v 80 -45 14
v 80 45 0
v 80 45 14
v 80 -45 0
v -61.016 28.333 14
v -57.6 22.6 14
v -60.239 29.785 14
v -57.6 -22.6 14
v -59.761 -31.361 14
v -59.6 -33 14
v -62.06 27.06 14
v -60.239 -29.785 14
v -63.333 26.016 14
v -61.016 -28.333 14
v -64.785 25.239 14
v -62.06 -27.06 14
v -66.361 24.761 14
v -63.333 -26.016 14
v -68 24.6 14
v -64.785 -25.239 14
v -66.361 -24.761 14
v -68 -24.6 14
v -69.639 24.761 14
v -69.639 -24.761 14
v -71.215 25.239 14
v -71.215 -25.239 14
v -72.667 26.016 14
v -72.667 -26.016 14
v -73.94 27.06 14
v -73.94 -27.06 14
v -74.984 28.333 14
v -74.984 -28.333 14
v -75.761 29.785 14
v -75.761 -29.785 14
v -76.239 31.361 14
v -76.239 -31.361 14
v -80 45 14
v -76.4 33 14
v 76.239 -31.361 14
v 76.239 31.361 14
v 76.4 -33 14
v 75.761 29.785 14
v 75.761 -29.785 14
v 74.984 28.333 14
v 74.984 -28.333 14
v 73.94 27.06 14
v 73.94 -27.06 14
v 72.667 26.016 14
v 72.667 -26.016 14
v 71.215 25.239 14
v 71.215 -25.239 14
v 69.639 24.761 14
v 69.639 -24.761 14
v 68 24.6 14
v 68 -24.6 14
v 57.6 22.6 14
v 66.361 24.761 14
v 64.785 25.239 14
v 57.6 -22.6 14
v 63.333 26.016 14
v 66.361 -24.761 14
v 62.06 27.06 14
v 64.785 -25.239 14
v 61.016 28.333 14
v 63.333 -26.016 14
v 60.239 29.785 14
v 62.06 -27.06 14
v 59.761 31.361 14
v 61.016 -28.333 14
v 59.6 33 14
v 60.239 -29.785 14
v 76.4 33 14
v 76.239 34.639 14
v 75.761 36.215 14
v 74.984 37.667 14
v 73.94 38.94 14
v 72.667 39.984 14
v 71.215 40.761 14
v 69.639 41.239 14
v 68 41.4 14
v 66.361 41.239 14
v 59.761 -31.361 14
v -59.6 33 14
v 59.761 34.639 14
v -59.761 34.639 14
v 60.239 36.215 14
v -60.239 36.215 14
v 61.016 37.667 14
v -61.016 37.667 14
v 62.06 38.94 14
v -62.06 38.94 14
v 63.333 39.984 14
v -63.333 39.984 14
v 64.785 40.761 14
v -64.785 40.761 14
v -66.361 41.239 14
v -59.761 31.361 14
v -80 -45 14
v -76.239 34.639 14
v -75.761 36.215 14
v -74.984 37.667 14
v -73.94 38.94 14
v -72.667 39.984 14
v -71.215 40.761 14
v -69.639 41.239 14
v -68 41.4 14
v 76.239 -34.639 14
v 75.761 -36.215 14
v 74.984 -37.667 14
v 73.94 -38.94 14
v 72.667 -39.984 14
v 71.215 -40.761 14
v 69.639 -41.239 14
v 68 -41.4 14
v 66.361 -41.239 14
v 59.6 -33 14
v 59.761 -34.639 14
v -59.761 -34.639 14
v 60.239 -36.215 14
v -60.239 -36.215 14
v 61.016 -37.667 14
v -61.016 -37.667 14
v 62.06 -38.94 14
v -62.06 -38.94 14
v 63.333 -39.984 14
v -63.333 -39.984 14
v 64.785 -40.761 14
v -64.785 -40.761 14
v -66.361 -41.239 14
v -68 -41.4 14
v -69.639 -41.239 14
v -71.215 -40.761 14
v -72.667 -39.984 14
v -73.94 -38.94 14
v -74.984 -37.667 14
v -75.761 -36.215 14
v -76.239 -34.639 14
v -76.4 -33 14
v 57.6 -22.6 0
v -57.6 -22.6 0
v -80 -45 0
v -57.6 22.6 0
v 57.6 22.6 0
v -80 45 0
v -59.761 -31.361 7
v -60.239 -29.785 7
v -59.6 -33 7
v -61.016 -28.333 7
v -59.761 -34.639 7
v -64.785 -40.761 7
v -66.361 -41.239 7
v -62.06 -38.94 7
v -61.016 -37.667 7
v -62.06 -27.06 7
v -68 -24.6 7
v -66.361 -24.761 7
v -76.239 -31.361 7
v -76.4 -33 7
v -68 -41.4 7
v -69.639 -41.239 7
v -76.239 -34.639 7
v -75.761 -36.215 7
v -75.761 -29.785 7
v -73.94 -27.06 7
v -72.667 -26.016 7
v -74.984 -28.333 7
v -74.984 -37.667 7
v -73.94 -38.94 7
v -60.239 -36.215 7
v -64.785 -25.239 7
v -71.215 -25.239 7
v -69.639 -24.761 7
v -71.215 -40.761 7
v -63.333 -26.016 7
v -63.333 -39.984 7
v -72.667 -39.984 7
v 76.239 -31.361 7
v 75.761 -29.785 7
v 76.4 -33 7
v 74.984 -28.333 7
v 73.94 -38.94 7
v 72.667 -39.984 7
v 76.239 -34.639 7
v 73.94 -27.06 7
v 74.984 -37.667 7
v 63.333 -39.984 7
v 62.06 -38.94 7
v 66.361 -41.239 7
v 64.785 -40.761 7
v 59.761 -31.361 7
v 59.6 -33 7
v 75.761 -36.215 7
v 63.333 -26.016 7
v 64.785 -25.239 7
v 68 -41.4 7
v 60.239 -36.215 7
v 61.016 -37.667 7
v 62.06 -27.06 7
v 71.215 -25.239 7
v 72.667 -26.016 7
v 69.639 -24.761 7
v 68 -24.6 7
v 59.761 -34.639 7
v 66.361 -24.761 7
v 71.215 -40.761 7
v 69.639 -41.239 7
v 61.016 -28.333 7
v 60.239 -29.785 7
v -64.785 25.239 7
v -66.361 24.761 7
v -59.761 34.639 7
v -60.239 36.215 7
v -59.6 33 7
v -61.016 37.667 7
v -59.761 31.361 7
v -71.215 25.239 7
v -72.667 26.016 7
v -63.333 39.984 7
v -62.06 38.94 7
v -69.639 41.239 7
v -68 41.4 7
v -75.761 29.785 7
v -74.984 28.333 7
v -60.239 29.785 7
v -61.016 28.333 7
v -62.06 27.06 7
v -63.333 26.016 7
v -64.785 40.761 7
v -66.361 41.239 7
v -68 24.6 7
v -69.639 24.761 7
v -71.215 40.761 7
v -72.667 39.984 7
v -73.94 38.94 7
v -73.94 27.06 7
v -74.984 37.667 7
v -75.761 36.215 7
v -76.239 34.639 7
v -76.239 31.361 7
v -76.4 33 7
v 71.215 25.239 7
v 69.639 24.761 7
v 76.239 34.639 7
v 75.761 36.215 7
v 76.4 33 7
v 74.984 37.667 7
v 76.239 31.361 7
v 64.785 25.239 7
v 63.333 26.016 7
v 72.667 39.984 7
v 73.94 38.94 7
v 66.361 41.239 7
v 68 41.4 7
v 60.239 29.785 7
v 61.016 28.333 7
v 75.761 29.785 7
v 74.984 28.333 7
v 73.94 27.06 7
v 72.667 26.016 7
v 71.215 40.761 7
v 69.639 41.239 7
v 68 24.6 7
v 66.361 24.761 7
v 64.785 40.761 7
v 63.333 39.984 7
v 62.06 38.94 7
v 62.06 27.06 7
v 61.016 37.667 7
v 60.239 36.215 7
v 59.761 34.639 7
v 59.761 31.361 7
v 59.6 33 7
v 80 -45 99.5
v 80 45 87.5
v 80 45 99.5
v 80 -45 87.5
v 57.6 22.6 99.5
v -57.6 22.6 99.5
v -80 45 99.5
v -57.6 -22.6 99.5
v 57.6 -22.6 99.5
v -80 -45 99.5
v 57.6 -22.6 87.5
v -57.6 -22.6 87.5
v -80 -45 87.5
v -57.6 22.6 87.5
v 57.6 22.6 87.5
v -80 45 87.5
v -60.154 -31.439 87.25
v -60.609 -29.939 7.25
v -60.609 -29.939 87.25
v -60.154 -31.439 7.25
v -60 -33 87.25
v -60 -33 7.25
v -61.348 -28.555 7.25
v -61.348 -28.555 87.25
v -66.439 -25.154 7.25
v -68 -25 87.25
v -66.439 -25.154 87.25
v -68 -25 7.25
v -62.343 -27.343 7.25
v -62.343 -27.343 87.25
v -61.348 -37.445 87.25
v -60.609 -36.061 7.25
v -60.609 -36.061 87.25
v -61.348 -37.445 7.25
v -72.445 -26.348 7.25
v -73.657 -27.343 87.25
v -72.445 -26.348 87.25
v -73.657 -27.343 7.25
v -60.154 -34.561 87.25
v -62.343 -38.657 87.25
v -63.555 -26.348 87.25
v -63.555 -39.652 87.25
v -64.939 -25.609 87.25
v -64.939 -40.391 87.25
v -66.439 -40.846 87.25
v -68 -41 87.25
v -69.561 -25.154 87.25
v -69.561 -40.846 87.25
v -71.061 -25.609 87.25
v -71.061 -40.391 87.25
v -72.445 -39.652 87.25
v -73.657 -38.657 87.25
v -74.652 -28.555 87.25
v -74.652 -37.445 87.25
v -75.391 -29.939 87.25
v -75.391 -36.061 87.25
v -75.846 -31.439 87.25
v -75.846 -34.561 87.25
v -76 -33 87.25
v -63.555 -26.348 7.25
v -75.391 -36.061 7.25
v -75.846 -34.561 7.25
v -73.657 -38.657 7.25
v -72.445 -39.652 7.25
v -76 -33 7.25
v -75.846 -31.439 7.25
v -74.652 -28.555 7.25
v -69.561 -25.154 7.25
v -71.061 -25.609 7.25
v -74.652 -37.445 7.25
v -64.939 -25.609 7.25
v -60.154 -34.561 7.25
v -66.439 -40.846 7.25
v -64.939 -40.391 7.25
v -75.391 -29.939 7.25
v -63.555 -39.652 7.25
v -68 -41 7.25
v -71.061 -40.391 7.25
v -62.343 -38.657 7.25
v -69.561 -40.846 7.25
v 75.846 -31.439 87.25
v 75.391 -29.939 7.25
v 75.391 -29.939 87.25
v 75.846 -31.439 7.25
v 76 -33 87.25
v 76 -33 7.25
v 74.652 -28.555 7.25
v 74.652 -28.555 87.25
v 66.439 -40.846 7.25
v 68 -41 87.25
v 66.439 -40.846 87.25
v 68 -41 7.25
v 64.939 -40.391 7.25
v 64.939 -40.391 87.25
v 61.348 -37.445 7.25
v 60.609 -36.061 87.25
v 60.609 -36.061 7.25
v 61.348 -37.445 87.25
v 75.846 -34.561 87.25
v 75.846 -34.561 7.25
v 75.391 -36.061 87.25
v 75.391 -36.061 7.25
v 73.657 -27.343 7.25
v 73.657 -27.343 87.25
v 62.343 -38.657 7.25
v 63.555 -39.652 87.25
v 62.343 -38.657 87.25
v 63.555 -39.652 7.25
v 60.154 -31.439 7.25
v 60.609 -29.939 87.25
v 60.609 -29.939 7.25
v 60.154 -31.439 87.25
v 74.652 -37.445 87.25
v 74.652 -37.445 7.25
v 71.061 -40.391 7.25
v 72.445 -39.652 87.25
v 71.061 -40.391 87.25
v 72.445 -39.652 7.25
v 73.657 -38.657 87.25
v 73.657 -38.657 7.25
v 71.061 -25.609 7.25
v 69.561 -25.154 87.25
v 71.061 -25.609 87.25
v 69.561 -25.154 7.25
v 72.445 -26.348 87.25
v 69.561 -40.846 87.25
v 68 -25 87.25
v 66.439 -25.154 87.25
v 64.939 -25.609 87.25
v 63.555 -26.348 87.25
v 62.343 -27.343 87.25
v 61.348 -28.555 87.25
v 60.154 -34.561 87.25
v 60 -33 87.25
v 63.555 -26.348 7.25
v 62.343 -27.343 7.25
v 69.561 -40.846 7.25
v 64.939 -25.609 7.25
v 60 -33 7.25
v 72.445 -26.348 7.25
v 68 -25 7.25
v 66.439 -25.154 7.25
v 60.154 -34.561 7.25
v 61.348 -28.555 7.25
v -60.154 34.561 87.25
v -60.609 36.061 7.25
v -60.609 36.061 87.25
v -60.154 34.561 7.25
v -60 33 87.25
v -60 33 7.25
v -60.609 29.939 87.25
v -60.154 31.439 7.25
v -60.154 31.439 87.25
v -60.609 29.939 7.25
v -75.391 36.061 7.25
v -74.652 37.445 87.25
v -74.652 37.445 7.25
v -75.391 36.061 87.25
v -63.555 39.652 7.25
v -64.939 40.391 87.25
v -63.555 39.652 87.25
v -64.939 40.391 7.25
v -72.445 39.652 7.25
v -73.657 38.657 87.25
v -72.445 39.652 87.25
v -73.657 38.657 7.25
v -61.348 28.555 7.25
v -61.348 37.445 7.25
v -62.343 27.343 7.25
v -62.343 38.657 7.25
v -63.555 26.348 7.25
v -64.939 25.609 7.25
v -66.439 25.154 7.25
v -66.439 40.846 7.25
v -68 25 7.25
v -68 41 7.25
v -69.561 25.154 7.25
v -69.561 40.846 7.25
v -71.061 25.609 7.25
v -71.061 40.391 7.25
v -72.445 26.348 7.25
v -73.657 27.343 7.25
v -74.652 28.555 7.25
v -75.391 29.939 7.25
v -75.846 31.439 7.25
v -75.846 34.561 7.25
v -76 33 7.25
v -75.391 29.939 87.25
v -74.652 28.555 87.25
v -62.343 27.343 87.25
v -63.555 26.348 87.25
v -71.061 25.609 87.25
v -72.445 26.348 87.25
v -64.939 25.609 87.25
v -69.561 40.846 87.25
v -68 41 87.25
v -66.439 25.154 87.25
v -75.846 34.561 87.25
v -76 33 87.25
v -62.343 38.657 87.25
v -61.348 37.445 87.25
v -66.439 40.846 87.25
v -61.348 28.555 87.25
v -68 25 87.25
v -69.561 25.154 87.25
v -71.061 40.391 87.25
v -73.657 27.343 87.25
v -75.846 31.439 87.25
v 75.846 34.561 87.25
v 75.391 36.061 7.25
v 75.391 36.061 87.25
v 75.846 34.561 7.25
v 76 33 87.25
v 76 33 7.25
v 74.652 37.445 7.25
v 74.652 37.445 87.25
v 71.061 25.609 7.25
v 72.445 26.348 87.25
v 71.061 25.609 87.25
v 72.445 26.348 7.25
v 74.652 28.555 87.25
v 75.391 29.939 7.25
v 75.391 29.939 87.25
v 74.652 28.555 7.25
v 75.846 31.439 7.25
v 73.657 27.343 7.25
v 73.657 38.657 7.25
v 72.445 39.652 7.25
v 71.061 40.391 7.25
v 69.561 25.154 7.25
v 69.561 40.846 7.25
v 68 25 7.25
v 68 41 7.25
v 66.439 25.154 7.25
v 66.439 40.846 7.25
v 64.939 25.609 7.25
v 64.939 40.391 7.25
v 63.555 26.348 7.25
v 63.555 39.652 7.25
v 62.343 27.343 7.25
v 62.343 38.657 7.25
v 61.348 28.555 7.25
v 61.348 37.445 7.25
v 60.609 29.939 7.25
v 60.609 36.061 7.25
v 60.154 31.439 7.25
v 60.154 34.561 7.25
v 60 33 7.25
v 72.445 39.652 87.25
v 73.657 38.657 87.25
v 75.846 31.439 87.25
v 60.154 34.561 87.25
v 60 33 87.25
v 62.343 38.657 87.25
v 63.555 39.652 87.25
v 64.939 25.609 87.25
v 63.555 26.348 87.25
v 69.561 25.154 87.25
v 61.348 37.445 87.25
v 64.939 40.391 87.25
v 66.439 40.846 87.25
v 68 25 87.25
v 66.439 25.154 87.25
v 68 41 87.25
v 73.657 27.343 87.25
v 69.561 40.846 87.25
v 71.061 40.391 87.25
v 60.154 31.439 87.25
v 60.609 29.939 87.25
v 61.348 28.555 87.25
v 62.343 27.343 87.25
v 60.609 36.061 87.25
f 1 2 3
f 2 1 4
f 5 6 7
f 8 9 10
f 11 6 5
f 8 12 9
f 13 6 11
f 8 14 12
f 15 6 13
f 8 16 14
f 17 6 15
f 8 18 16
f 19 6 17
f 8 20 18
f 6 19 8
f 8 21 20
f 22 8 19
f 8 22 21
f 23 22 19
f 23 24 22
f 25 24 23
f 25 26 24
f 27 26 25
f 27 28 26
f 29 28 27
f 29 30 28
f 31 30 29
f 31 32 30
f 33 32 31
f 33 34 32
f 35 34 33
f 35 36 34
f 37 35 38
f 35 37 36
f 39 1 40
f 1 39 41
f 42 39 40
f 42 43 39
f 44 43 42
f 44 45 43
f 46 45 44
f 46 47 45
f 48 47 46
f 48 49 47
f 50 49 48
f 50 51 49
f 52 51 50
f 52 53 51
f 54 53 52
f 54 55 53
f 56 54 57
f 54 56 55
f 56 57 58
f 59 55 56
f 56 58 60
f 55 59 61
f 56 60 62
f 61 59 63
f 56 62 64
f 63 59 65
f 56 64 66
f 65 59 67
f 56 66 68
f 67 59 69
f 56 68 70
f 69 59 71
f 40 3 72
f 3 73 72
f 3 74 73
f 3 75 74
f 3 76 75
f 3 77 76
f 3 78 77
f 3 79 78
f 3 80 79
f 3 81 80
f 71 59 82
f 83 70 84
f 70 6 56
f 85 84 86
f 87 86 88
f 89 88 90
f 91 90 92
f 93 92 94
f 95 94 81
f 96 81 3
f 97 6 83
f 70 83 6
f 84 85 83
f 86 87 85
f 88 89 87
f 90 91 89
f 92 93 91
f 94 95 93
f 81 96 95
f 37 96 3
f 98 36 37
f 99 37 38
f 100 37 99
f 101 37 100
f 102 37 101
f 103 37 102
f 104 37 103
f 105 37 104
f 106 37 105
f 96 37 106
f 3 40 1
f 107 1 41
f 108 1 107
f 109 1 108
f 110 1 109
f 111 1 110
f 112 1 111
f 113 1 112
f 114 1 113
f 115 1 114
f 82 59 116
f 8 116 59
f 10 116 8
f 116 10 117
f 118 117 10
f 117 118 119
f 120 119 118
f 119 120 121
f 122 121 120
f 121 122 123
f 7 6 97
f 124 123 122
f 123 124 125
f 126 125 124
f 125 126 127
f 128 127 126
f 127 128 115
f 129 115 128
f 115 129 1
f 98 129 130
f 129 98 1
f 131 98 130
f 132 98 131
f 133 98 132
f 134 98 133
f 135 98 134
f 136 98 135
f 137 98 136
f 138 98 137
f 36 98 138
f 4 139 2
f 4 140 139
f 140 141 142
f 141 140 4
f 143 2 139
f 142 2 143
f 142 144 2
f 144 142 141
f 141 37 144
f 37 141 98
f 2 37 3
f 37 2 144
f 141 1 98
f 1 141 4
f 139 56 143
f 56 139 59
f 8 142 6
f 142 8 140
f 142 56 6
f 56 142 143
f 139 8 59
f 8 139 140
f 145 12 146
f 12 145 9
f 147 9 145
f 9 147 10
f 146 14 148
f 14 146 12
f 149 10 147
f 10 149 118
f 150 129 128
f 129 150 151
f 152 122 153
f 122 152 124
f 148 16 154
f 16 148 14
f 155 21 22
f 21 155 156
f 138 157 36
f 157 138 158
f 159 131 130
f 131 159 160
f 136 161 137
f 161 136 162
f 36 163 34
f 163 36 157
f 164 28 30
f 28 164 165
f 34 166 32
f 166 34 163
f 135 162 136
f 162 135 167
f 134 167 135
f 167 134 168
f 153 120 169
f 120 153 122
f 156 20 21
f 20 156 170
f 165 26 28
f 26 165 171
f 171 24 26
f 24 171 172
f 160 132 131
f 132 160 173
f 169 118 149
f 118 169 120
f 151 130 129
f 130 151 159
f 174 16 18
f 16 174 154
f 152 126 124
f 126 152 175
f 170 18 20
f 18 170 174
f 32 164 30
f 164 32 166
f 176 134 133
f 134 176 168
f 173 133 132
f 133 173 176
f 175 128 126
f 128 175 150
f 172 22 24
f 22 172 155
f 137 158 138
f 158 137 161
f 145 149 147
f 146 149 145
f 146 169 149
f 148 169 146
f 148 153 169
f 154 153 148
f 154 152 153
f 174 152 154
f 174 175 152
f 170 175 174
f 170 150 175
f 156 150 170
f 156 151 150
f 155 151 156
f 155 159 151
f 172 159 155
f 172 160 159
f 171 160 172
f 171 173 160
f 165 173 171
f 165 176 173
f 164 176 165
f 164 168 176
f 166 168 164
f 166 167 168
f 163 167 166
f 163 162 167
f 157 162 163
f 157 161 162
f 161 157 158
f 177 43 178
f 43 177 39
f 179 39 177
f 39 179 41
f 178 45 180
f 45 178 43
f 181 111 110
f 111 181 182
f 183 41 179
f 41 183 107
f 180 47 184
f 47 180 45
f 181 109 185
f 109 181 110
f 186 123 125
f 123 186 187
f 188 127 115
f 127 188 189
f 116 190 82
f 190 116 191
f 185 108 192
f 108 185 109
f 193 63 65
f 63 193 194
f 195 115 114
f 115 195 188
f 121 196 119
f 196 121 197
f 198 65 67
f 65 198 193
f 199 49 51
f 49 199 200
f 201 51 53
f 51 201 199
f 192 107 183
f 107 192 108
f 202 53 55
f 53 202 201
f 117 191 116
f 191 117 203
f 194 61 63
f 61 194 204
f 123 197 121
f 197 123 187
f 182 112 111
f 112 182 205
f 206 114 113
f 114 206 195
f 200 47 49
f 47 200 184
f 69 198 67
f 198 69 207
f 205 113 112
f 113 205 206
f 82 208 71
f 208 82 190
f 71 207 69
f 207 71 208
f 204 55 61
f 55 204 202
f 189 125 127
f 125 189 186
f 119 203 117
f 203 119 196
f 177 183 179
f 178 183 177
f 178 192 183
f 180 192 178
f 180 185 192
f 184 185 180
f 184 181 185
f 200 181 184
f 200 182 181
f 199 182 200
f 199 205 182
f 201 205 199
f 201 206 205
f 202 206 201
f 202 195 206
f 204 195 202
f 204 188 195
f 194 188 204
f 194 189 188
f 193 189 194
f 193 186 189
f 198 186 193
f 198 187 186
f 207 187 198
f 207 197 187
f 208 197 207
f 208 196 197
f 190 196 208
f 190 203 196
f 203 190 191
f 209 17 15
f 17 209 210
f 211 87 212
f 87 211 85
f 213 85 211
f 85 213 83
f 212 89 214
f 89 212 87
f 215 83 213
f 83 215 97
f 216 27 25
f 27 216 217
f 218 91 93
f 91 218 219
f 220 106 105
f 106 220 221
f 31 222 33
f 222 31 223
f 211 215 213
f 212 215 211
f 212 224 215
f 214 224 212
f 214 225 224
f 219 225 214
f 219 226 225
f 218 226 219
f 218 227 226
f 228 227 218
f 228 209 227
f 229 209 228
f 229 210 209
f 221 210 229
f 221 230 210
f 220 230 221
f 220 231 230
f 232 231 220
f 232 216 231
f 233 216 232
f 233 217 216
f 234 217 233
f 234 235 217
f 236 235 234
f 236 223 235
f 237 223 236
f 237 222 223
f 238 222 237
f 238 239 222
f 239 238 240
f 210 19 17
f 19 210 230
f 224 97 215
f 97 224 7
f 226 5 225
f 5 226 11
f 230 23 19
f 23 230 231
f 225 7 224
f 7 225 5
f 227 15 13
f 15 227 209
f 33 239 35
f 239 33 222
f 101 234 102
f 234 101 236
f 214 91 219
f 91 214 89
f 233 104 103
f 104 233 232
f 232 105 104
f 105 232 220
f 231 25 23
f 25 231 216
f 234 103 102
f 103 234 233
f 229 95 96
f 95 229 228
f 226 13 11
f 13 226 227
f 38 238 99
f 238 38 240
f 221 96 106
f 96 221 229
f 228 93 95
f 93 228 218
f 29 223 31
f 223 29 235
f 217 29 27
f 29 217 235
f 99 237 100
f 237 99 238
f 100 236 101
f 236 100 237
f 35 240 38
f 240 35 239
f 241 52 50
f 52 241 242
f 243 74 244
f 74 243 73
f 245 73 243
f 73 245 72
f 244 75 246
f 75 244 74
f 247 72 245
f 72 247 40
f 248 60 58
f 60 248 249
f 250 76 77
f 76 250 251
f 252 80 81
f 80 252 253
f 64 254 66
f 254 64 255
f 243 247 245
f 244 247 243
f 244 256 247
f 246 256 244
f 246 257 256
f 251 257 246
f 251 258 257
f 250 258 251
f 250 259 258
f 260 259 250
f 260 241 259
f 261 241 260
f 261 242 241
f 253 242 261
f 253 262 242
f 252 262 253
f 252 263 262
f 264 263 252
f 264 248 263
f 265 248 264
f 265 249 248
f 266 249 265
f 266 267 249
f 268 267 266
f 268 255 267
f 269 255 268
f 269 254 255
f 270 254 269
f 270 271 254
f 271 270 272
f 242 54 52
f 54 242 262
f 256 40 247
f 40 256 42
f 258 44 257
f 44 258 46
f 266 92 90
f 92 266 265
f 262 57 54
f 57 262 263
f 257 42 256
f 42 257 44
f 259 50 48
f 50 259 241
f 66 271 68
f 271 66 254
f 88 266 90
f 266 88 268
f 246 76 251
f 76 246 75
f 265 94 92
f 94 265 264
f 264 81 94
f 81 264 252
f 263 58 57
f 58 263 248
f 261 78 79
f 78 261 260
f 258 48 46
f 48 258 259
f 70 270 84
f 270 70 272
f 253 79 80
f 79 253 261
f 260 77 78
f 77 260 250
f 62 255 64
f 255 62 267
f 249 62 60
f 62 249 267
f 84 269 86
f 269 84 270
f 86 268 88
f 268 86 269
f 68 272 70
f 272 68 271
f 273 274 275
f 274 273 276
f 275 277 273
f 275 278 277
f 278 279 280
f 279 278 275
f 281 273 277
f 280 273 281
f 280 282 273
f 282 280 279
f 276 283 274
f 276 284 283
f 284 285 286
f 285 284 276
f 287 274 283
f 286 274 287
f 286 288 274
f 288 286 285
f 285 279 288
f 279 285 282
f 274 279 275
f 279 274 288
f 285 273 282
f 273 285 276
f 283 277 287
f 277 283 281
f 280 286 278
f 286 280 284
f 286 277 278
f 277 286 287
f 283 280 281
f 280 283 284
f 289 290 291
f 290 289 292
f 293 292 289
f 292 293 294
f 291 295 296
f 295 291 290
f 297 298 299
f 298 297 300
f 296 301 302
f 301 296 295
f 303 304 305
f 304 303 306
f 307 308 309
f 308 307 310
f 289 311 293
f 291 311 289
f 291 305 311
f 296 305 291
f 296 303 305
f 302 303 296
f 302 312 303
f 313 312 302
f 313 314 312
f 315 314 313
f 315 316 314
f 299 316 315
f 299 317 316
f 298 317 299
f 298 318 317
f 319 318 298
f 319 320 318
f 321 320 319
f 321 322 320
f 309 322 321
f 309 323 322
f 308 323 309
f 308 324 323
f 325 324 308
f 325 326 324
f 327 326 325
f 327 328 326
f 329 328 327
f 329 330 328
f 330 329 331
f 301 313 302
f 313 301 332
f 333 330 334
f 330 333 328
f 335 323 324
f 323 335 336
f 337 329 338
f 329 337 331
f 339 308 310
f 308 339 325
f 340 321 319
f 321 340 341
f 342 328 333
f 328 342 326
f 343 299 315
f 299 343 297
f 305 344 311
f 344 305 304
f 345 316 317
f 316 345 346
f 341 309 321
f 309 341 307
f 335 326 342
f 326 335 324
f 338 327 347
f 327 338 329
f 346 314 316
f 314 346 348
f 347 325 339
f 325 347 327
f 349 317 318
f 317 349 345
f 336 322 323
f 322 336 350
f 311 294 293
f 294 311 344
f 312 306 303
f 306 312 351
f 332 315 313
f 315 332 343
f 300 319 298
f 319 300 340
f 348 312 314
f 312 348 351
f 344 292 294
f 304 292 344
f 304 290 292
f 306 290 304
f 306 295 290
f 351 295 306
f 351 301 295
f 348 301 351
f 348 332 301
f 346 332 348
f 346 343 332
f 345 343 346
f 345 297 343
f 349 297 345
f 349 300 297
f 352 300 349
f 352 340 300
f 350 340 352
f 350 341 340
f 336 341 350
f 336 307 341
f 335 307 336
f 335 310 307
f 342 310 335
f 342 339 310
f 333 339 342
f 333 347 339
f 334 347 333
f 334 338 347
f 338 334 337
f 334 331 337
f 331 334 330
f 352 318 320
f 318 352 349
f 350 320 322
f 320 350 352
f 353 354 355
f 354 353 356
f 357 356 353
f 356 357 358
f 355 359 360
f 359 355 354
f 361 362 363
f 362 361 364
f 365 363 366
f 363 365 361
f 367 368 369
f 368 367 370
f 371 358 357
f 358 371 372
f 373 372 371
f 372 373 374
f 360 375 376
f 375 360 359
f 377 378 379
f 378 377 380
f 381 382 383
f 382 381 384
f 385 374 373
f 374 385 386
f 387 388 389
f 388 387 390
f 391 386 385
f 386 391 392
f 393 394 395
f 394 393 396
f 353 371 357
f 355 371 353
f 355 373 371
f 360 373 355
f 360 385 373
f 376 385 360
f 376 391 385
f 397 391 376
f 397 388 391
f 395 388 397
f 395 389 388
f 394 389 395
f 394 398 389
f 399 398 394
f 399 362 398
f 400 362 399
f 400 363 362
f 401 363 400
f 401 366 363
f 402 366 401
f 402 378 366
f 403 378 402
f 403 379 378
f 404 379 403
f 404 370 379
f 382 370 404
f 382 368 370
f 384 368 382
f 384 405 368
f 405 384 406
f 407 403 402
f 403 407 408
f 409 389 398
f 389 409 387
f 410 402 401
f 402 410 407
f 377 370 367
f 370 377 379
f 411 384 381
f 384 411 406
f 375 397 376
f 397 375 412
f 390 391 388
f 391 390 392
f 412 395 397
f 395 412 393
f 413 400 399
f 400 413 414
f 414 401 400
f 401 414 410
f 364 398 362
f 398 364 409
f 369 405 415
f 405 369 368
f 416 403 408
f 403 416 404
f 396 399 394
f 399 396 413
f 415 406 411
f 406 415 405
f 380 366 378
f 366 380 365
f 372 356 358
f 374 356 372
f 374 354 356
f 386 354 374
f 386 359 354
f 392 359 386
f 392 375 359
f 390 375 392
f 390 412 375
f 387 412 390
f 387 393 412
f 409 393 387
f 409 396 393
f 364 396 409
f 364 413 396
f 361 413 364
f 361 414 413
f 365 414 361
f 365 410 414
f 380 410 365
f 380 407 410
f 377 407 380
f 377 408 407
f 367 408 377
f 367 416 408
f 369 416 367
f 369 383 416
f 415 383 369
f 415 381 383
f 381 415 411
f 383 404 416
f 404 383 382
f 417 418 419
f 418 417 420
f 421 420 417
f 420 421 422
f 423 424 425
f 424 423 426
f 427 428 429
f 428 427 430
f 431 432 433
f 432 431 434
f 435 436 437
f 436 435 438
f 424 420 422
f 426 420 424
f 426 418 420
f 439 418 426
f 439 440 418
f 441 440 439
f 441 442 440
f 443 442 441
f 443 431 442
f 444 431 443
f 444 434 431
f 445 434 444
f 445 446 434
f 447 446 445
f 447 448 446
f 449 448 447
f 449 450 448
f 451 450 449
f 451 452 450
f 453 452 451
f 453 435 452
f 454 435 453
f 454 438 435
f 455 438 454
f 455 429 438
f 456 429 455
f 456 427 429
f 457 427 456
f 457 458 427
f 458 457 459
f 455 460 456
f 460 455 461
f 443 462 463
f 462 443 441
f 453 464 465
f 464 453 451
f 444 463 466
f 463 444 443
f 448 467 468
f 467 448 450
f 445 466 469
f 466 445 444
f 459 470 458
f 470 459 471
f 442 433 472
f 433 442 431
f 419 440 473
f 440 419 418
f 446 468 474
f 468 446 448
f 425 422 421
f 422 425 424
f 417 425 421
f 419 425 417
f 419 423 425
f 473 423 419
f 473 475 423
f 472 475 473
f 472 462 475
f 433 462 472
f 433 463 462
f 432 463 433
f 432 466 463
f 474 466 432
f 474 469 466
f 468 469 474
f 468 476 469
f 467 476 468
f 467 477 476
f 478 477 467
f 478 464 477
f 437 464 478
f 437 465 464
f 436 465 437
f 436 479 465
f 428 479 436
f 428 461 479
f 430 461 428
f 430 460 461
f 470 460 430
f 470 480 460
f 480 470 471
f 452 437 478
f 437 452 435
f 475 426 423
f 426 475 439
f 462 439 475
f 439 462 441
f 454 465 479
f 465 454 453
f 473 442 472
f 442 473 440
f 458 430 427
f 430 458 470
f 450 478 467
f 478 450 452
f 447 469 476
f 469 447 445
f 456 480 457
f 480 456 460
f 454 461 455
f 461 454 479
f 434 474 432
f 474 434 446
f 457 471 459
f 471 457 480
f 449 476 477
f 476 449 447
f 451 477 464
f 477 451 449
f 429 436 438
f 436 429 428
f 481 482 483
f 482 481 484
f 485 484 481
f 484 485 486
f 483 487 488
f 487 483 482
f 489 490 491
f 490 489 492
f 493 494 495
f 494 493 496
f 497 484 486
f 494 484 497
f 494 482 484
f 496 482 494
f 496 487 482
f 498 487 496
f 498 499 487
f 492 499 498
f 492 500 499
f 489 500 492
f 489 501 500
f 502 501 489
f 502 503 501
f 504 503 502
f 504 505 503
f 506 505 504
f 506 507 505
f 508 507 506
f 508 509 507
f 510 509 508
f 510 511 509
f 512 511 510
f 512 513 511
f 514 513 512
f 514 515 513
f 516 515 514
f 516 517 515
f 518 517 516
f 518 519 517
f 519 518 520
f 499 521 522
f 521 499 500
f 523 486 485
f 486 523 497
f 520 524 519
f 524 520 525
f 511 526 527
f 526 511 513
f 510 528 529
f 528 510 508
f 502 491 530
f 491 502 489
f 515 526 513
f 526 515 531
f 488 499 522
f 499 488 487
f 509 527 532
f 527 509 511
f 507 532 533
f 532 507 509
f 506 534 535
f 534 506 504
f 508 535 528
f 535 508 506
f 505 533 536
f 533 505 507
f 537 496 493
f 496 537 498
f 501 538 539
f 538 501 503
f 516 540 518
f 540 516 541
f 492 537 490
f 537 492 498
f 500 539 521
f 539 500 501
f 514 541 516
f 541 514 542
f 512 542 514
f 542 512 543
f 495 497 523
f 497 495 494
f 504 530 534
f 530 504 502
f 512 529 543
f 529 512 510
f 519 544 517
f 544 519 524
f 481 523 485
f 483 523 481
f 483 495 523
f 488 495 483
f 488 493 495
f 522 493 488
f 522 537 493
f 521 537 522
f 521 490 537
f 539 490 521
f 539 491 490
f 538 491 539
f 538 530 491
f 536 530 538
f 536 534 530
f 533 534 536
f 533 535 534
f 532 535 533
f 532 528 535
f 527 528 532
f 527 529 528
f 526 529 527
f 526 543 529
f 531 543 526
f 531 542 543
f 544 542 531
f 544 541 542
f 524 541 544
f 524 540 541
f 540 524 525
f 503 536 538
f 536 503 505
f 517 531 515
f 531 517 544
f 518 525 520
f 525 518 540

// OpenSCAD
$fn = 32;

// ------------------------------------------------------------------------
// Frame cube: base 160 x 90 mm, posts 80 mm tall
// Every part is its own module, assembly() places every instance.
// ------------------------------------------------------------------------

// --- part 1 ---
module base_frame() {
  difference() {
    translate([-80, -45, 0]) cube([160, 90, 14]);
    translate([-57.6, -22.6, -1]) cube([115.2, 45.2, 16]);
    translate([-68, -33, 7]) cylinder(h = 8, d = 16.8);
    translate([68, -33, 7]) cylinder(h = 8, d = 16.8);
    translate([-68, 33, 7]) cylinder(h = 8, d = 16.8);
    translate([68, 33, 7]) cylinder(h = 8, d = 16.8);
  }
}

// --- part 2 ---
module corner_post() {
  cylinder(h = 80, d = 16);
}

// --- part 3 ---
module top_frame() {
  difference() {
    translate([-80, -45, 0]) cube([160, 90, 12]);
    translate([-57.6, -22.6, -1]) cube([115.2, 45.2, 14]);
  }
}

// --- assembly ---
module assembly() {
  color([0.80, 0.24, 0.20]) translate([0, 0, 0]) rotate([0, 0, 0]) base_frame();
  color([0.20, 0.45, 0.75]) translate([-68, -33, 7.25]) rotate([0, 0, 0]) corner_post();
  color([0.25, 0.62, 0.32]) translate([68, -33, 7.25]) rotate([0, 0, 0]) corner_post();
  color([0.92, 0.70, 0.18]) translate([-68, 33, 7.25]) rotate([0, 0, 0]) corner_post();
  color([0.58, 0.35, 0.70]) translate([68, 33, 7.25]) rotate([0, 0, 0]) corner_post();
  color([0.16, 0.66, 0.66]) translate([0, 0, 87.5]) rotate([0, 0, 0]) top_frame();
}

assembly();
